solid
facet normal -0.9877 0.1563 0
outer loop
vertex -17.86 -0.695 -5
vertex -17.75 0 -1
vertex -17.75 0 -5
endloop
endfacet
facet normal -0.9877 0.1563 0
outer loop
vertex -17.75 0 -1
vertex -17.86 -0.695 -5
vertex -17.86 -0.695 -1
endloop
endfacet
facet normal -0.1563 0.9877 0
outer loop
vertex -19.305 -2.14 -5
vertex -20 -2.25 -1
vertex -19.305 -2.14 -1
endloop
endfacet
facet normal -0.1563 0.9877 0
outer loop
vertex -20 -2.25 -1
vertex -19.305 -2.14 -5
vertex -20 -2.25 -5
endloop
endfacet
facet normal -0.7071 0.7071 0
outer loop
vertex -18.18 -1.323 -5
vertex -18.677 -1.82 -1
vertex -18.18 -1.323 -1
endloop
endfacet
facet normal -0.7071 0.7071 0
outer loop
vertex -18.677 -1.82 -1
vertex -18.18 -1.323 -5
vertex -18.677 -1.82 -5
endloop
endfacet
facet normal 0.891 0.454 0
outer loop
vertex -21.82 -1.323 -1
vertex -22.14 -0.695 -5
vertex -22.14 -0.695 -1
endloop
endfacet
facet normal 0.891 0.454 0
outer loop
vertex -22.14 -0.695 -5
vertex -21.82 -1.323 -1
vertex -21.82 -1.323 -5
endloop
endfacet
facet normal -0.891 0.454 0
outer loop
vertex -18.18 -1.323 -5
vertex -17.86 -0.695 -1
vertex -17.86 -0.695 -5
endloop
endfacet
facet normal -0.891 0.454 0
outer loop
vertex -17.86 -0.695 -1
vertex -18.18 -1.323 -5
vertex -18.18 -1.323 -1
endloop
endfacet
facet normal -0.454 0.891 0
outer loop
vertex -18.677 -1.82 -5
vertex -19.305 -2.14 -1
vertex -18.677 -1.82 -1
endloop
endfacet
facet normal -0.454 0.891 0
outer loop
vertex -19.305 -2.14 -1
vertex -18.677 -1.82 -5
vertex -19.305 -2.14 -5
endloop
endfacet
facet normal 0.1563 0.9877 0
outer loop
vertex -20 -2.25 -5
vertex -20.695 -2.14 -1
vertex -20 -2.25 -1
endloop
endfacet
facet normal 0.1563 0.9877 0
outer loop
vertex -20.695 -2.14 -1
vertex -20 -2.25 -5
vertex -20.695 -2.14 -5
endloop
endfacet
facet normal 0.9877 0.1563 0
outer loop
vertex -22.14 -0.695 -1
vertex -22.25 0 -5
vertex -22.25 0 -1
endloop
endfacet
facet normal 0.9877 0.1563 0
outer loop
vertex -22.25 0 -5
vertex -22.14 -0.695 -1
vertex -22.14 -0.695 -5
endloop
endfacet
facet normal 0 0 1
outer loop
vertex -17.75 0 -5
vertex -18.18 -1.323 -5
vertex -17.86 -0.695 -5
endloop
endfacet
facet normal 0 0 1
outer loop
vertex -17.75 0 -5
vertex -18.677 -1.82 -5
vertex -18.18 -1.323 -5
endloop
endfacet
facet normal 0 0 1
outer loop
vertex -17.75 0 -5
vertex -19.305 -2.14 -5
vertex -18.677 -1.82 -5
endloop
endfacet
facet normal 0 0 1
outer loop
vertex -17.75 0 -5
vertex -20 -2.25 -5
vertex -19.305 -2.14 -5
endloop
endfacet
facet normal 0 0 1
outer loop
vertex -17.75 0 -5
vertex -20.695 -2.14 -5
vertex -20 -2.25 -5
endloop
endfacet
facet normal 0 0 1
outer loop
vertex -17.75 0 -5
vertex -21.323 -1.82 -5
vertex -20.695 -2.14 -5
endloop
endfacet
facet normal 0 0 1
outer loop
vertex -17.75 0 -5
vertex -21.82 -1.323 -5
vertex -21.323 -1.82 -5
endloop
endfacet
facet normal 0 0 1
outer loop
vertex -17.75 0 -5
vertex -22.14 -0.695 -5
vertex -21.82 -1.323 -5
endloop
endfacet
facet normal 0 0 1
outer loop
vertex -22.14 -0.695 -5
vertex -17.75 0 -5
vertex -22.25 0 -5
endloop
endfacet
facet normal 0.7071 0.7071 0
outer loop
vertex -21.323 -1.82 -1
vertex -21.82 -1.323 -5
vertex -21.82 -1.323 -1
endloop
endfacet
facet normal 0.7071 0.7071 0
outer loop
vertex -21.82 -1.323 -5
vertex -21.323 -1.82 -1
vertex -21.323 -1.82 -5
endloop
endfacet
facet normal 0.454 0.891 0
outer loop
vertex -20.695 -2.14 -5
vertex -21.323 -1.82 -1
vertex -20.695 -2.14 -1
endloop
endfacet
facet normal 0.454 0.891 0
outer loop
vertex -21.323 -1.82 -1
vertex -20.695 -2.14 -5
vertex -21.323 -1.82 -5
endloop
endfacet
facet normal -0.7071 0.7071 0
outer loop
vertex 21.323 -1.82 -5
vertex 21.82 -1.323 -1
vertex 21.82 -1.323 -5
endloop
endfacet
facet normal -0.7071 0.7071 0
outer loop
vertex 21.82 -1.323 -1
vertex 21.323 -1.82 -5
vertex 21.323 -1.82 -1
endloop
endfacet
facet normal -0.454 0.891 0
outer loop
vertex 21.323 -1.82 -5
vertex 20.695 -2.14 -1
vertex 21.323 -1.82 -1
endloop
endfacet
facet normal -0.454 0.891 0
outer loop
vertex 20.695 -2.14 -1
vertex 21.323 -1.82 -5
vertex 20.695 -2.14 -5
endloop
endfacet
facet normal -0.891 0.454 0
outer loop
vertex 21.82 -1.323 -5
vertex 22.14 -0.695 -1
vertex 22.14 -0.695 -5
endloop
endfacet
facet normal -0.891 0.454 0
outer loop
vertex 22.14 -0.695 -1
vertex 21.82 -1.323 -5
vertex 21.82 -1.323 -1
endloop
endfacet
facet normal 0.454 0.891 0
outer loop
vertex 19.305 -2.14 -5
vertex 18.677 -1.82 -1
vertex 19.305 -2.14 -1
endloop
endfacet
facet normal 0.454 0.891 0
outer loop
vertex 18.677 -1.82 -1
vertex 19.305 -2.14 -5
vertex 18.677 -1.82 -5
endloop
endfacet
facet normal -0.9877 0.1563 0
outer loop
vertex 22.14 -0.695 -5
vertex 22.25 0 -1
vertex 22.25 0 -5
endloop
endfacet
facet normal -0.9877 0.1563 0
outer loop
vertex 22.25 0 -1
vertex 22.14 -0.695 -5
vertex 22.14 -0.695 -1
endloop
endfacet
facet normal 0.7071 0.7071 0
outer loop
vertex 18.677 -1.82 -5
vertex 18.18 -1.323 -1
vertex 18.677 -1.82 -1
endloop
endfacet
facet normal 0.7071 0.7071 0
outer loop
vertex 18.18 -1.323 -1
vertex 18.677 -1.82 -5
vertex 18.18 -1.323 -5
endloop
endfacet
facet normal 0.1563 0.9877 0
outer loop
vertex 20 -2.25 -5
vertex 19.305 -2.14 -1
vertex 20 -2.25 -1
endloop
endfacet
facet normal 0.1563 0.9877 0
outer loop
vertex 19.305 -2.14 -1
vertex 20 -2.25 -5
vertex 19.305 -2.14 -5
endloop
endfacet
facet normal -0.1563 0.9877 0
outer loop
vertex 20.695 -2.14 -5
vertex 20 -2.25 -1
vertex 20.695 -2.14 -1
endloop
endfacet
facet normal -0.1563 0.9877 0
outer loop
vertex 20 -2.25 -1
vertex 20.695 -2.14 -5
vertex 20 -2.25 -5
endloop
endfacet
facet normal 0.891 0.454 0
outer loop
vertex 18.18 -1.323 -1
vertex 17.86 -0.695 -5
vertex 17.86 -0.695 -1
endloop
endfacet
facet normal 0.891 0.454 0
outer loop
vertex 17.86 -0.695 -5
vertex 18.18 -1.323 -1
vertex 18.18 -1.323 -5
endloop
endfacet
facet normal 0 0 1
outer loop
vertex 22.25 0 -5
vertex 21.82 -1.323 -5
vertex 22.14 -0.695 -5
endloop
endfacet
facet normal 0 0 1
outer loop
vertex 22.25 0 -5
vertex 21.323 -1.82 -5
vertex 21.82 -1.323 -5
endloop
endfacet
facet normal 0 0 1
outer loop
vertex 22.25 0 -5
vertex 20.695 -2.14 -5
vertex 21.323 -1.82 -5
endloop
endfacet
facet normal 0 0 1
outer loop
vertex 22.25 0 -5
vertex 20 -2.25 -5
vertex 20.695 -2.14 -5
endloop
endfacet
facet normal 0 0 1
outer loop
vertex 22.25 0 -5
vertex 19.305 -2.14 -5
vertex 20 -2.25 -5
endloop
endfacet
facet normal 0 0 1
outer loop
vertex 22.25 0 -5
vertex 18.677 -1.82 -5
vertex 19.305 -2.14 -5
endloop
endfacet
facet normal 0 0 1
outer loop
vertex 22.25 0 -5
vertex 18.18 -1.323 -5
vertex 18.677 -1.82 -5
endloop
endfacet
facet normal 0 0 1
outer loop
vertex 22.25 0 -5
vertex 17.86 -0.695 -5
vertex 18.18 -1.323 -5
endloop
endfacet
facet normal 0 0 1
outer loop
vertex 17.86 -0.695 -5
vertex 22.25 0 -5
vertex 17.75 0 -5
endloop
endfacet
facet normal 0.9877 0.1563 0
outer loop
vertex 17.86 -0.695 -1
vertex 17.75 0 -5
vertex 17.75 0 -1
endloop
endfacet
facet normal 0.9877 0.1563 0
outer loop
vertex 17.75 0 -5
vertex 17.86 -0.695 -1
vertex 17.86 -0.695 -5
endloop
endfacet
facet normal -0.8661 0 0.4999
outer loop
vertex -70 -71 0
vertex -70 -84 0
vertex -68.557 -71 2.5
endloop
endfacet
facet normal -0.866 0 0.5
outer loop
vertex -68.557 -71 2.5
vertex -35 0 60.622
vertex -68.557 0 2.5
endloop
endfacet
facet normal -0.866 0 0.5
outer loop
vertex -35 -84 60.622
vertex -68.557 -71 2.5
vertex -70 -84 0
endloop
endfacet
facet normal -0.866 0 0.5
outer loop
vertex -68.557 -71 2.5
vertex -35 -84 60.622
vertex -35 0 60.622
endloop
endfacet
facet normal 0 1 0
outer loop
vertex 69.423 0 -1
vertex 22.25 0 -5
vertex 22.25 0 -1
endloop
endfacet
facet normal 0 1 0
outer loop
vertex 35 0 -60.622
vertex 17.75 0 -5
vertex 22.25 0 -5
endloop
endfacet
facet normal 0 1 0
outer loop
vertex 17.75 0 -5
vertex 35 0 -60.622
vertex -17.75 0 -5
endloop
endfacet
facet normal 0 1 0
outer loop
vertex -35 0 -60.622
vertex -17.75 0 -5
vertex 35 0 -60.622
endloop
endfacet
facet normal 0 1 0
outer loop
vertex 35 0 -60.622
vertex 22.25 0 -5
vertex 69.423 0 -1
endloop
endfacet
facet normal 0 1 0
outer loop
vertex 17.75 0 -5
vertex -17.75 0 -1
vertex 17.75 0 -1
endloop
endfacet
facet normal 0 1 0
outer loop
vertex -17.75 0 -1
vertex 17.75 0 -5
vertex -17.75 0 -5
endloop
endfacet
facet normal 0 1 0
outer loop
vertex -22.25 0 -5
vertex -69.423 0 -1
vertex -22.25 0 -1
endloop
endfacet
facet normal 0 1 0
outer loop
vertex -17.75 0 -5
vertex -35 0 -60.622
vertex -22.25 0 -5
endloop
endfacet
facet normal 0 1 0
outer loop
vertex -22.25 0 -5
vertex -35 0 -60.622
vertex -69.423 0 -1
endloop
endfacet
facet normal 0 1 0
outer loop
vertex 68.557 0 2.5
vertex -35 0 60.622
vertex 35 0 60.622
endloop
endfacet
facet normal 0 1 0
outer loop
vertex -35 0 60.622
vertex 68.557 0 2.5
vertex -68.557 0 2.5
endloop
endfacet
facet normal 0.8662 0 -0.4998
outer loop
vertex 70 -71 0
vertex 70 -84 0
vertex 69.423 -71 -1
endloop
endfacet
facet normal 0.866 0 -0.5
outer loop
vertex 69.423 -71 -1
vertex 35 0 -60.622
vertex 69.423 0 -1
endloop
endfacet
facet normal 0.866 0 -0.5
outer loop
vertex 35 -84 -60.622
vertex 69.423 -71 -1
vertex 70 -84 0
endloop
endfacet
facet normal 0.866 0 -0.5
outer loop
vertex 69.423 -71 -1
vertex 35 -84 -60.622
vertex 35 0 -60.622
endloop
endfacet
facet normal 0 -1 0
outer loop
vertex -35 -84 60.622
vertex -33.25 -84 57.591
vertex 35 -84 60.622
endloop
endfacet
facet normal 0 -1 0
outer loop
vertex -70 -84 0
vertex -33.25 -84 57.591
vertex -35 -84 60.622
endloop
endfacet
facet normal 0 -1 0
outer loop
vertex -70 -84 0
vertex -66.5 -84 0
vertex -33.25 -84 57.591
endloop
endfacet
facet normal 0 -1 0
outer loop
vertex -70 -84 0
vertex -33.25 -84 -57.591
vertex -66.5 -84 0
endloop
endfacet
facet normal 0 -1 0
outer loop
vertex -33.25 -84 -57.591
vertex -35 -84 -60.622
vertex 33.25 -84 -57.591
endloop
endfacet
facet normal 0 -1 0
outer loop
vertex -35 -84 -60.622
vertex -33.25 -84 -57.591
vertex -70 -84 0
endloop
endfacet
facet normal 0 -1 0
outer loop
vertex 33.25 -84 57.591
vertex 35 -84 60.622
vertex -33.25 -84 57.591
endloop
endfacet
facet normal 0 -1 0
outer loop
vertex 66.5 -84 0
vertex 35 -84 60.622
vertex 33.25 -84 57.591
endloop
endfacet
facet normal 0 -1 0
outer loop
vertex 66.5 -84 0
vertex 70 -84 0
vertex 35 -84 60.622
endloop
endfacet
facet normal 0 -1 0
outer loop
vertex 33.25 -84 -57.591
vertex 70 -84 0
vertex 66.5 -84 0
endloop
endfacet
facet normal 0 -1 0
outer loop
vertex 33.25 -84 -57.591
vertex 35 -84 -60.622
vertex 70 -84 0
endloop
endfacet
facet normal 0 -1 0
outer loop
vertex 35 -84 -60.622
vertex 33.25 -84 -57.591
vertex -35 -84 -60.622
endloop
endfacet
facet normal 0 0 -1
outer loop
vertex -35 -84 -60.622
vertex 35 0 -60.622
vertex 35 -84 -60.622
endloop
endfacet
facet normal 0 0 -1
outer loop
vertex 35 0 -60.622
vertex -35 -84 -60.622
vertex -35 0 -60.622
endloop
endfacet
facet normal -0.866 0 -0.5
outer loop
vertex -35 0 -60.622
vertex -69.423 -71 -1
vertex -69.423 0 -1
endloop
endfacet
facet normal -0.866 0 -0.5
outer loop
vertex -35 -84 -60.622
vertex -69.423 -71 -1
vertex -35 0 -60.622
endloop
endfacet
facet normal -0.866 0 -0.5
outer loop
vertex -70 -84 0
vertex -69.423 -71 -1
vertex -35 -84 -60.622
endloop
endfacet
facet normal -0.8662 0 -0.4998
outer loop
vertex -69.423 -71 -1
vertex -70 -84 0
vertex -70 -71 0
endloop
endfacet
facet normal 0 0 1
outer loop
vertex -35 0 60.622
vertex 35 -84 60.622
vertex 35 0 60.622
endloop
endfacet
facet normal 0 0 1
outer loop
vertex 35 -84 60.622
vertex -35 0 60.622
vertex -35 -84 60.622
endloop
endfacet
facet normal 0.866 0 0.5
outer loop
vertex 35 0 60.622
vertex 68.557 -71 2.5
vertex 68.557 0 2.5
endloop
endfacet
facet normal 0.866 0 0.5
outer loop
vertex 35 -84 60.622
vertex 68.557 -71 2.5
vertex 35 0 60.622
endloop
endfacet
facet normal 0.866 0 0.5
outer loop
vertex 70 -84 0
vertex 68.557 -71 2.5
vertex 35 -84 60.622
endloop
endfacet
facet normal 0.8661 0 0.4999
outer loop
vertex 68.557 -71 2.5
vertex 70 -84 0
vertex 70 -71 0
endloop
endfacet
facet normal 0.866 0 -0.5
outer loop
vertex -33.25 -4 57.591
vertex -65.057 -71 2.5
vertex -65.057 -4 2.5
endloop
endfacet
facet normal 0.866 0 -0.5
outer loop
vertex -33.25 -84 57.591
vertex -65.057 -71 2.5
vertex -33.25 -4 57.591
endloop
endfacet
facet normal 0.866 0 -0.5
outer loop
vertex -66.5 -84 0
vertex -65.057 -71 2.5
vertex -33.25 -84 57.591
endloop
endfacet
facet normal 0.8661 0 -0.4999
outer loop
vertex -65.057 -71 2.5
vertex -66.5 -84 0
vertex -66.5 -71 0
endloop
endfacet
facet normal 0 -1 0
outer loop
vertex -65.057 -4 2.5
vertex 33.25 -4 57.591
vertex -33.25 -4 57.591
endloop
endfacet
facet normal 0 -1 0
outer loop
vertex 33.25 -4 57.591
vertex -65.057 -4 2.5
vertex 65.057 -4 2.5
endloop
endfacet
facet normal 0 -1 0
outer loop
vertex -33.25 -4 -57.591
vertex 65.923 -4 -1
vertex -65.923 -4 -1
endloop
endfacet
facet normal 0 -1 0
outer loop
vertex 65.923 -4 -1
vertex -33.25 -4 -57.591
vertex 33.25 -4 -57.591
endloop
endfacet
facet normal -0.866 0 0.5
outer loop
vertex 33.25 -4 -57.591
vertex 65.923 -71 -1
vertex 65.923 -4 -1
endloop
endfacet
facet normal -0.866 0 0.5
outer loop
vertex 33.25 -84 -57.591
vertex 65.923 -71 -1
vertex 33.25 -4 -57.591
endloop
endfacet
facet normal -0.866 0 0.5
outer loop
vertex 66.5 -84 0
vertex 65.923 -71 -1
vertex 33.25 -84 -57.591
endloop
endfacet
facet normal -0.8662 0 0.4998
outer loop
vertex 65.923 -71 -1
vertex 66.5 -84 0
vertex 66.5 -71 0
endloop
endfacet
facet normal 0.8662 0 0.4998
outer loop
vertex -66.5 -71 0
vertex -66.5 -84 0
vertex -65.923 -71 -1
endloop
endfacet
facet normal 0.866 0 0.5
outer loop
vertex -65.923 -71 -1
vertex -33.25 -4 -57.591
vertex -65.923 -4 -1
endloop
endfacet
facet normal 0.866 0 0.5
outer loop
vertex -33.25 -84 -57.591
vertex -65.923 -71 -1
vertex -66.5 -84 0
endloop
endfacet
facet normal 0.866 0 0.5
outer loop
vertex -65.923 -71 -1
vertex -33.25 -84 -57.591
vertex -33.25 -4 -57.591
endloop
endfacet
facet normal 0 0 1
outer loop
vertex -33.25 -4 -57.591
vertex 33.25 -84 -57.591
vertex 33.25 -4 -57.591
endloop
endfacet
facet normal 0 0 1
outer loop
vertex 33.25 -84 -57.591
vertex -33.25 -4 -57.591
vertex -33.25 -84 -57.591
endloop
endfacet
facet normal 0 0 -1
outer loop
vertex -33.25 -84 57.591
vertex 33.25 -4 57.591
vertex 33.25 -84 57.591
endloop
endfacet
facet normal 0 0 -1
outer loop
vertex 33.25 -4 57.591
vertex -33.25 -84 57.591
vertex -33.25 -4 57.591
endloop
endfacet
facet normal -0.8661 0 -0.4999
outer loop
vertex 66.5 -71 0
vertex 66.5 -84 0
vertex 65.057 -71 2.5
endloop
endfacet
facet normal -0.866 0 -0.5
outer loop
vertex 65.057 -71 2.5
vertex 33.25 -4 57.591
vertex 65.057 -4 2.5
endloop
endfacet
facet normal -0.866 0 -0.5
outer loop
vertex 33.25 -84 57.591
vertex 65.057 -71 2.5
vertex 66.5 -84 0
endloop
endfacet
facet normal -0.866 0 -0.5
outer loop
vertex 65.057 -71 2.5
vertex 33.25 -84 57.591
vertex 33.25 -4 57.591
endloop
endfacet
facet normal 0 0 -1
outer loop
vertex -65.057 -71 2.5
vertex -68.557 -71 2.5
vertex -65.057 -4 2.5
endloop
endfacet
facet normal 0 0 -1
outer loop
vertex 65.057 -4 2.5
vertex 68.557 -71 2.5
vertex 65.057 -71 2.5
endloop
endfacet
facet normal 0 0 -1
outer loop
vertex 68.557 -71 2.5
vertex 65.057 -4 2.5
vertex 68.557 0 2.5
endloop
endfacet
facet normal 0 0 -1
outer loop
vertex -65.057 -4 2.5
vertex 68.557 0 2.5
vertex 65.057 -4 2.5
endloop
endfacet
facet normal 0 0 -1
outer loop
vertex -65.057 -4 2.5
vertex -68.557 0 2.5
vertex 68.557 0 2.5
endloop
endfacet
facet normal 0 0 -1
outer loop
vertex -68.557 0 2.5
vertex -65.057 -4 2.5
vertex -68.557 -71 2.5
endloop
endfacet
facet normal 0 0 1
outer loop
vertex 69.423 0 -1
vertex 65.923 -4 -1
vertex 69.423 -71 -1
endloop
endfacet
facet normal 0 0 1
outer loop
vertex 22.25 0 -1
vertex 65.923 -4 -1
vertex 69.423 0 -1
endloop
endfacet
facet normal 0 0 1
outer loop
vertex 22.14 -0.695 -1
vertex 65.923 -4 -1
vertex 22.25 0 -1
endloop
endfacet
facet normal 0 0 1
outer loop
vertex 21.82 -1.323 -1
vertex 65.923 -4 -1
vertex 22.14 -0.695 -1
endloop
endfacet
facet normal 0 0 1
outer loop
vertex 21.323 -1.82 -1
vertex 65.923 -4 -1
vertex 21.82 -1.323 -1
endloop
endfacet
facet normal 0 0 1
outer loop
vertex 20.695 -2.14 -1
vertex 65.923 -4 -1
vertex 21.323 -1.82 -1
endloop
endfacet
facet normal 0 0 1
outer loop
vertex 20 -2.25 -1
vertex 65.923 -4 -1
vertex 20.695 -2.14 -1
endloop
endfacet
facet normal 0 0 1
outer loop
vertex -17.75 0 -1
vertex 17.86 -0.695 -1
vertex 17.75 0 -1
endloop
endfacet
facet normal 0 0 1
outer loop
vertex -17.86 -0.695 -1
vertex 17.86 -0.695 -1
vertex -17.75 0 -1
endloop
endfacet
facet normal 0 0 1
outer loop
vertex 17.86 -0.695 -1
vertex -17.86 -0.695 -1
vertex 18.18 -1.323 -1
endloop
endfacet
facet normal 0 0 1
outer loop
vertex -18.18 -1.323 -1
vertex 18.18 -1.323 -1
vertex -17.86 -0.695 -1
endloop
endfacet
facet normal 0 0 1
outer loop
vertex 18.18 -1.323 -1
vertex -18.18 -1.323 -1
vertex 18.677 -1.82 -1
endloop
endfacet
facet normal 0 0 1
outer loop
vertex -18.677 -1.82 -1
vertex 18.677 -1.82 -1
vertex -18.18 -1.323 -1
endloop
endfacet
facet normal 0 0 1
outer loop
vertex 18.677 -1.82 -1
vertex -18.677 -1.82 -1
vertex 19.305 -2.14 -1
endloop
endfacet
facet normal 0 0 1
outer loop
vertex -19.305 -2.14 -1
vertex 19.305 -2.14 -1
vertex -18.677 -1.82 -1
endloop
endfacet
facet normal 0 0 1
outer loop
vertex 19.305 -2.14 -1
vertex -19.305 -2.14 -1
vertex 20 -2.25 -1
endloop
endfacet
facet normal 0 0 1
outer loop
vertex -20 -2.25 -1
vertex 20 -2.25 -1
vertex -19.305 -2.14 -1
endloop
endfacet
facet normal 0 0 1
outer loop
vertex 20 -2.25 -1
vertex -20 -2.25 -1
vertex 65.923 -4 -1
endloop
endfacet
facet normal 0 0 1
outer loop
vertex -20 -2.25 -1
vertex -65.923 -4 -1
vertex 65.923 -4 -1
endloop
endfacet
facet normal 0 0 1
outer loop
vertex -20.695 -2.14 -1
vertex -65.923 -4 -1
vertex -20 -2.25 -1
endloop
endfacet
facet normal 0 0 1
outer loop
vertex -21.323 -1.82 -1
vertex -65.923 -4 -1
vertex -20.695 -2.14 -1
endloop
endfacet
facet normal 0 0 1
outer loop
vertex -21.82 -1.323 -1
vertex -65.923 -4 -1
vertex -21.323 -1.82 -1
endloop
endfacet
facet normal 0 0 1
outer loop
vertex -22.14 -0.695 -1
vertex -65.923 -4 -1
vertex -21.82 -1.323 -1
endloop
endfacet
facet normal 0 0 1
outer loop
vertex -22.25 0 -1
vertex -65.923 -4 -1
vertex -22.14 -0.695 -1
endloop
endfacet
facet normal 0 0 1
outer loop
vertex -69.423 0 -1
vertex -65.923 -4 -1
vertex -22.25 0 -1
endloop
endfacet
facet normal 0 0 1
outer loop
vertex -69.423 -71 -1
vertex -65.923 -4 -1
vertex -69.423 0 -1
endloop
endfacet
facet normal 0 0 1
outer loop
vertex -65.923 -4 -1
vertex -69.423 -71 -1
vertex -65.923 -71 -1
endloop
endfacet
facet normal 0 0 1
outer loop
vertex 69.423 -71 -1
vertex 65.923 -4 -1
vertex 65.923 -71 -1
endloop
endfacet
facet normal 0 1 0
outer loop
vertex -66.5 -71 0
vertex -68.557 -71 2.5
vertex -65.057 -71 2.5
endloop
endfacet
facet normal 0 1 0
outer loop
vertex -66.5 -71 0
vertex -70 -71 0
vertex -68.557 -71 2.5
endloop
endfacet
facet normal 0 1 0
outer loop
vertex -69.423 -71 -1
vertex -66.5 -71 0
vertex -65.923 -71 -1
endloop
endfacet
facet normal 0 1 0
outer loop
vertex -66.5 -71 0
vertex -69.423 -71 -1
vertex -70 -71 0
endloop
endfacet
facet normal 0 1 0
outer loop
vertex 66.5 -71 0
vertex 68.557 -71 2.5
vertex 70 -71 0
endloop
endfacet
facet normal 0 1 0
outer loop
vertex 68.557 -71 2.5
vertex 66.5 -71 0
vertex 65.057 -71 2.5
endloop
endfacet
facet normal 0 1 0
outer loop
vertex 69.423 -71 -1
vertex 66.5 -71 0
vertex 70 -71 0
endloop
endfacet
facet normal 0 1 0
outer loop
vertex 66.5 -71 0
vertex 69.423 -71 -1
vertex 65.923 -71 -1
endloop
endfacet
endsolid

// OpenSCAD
// Honeycomb Wall Shelf - Modular, Stackable
// Each cell is a standalone shelf — mount as many as you want
// Print: 0.2mm, 4 walls, 20% infill, no supports (print hex face-down)
// Mounting: 2x M4 screws through back wall

CELL_R   = 70;    // Hex cell radius (center to vertex)
DEPTH    = 80;    // Shelf depth
WALL_T   = 3.5;
BACK_T   = 4.0;
SCREW_D  = 4.5;
SCREW_OFFSET = 20;

// Regular hexagon
module hex_prism(r, h) {
    linear_extrude(h)
        polygon([for (i=[0:5]) [r * cos(i*60), r * sin(i*60)]]);
}

module honeycomb_cell() {
    difference() {
        // Outer hex
        rotate([90, 0, 0])
            hex_prism(CELL_R, DEPTH + BACK_T);

        // Inner cavity (the shelf space)
        rotate([90, 0, 0])
            translate([0, 0, BACK_T])
                hex_prism(CELL_R - WALL_T, DEPTH + 1);

        // Open front face
        translate([-(CELL_R + 1), -(CELL_R + 1), -1])
            cube([CELL_R * 2 + 2, CELL_R * 2 + 2, WALL_T]);

        // Screw holes through back wall
        for (s = [-1, 1])
            translate([s * SCREW_OFFSET, 0, -(BACK_T + 1)])
                cylinder(d = SCREW_D, h = BACK_T + 2, $fn = 20);
    }
}

honeycomb_cell();
